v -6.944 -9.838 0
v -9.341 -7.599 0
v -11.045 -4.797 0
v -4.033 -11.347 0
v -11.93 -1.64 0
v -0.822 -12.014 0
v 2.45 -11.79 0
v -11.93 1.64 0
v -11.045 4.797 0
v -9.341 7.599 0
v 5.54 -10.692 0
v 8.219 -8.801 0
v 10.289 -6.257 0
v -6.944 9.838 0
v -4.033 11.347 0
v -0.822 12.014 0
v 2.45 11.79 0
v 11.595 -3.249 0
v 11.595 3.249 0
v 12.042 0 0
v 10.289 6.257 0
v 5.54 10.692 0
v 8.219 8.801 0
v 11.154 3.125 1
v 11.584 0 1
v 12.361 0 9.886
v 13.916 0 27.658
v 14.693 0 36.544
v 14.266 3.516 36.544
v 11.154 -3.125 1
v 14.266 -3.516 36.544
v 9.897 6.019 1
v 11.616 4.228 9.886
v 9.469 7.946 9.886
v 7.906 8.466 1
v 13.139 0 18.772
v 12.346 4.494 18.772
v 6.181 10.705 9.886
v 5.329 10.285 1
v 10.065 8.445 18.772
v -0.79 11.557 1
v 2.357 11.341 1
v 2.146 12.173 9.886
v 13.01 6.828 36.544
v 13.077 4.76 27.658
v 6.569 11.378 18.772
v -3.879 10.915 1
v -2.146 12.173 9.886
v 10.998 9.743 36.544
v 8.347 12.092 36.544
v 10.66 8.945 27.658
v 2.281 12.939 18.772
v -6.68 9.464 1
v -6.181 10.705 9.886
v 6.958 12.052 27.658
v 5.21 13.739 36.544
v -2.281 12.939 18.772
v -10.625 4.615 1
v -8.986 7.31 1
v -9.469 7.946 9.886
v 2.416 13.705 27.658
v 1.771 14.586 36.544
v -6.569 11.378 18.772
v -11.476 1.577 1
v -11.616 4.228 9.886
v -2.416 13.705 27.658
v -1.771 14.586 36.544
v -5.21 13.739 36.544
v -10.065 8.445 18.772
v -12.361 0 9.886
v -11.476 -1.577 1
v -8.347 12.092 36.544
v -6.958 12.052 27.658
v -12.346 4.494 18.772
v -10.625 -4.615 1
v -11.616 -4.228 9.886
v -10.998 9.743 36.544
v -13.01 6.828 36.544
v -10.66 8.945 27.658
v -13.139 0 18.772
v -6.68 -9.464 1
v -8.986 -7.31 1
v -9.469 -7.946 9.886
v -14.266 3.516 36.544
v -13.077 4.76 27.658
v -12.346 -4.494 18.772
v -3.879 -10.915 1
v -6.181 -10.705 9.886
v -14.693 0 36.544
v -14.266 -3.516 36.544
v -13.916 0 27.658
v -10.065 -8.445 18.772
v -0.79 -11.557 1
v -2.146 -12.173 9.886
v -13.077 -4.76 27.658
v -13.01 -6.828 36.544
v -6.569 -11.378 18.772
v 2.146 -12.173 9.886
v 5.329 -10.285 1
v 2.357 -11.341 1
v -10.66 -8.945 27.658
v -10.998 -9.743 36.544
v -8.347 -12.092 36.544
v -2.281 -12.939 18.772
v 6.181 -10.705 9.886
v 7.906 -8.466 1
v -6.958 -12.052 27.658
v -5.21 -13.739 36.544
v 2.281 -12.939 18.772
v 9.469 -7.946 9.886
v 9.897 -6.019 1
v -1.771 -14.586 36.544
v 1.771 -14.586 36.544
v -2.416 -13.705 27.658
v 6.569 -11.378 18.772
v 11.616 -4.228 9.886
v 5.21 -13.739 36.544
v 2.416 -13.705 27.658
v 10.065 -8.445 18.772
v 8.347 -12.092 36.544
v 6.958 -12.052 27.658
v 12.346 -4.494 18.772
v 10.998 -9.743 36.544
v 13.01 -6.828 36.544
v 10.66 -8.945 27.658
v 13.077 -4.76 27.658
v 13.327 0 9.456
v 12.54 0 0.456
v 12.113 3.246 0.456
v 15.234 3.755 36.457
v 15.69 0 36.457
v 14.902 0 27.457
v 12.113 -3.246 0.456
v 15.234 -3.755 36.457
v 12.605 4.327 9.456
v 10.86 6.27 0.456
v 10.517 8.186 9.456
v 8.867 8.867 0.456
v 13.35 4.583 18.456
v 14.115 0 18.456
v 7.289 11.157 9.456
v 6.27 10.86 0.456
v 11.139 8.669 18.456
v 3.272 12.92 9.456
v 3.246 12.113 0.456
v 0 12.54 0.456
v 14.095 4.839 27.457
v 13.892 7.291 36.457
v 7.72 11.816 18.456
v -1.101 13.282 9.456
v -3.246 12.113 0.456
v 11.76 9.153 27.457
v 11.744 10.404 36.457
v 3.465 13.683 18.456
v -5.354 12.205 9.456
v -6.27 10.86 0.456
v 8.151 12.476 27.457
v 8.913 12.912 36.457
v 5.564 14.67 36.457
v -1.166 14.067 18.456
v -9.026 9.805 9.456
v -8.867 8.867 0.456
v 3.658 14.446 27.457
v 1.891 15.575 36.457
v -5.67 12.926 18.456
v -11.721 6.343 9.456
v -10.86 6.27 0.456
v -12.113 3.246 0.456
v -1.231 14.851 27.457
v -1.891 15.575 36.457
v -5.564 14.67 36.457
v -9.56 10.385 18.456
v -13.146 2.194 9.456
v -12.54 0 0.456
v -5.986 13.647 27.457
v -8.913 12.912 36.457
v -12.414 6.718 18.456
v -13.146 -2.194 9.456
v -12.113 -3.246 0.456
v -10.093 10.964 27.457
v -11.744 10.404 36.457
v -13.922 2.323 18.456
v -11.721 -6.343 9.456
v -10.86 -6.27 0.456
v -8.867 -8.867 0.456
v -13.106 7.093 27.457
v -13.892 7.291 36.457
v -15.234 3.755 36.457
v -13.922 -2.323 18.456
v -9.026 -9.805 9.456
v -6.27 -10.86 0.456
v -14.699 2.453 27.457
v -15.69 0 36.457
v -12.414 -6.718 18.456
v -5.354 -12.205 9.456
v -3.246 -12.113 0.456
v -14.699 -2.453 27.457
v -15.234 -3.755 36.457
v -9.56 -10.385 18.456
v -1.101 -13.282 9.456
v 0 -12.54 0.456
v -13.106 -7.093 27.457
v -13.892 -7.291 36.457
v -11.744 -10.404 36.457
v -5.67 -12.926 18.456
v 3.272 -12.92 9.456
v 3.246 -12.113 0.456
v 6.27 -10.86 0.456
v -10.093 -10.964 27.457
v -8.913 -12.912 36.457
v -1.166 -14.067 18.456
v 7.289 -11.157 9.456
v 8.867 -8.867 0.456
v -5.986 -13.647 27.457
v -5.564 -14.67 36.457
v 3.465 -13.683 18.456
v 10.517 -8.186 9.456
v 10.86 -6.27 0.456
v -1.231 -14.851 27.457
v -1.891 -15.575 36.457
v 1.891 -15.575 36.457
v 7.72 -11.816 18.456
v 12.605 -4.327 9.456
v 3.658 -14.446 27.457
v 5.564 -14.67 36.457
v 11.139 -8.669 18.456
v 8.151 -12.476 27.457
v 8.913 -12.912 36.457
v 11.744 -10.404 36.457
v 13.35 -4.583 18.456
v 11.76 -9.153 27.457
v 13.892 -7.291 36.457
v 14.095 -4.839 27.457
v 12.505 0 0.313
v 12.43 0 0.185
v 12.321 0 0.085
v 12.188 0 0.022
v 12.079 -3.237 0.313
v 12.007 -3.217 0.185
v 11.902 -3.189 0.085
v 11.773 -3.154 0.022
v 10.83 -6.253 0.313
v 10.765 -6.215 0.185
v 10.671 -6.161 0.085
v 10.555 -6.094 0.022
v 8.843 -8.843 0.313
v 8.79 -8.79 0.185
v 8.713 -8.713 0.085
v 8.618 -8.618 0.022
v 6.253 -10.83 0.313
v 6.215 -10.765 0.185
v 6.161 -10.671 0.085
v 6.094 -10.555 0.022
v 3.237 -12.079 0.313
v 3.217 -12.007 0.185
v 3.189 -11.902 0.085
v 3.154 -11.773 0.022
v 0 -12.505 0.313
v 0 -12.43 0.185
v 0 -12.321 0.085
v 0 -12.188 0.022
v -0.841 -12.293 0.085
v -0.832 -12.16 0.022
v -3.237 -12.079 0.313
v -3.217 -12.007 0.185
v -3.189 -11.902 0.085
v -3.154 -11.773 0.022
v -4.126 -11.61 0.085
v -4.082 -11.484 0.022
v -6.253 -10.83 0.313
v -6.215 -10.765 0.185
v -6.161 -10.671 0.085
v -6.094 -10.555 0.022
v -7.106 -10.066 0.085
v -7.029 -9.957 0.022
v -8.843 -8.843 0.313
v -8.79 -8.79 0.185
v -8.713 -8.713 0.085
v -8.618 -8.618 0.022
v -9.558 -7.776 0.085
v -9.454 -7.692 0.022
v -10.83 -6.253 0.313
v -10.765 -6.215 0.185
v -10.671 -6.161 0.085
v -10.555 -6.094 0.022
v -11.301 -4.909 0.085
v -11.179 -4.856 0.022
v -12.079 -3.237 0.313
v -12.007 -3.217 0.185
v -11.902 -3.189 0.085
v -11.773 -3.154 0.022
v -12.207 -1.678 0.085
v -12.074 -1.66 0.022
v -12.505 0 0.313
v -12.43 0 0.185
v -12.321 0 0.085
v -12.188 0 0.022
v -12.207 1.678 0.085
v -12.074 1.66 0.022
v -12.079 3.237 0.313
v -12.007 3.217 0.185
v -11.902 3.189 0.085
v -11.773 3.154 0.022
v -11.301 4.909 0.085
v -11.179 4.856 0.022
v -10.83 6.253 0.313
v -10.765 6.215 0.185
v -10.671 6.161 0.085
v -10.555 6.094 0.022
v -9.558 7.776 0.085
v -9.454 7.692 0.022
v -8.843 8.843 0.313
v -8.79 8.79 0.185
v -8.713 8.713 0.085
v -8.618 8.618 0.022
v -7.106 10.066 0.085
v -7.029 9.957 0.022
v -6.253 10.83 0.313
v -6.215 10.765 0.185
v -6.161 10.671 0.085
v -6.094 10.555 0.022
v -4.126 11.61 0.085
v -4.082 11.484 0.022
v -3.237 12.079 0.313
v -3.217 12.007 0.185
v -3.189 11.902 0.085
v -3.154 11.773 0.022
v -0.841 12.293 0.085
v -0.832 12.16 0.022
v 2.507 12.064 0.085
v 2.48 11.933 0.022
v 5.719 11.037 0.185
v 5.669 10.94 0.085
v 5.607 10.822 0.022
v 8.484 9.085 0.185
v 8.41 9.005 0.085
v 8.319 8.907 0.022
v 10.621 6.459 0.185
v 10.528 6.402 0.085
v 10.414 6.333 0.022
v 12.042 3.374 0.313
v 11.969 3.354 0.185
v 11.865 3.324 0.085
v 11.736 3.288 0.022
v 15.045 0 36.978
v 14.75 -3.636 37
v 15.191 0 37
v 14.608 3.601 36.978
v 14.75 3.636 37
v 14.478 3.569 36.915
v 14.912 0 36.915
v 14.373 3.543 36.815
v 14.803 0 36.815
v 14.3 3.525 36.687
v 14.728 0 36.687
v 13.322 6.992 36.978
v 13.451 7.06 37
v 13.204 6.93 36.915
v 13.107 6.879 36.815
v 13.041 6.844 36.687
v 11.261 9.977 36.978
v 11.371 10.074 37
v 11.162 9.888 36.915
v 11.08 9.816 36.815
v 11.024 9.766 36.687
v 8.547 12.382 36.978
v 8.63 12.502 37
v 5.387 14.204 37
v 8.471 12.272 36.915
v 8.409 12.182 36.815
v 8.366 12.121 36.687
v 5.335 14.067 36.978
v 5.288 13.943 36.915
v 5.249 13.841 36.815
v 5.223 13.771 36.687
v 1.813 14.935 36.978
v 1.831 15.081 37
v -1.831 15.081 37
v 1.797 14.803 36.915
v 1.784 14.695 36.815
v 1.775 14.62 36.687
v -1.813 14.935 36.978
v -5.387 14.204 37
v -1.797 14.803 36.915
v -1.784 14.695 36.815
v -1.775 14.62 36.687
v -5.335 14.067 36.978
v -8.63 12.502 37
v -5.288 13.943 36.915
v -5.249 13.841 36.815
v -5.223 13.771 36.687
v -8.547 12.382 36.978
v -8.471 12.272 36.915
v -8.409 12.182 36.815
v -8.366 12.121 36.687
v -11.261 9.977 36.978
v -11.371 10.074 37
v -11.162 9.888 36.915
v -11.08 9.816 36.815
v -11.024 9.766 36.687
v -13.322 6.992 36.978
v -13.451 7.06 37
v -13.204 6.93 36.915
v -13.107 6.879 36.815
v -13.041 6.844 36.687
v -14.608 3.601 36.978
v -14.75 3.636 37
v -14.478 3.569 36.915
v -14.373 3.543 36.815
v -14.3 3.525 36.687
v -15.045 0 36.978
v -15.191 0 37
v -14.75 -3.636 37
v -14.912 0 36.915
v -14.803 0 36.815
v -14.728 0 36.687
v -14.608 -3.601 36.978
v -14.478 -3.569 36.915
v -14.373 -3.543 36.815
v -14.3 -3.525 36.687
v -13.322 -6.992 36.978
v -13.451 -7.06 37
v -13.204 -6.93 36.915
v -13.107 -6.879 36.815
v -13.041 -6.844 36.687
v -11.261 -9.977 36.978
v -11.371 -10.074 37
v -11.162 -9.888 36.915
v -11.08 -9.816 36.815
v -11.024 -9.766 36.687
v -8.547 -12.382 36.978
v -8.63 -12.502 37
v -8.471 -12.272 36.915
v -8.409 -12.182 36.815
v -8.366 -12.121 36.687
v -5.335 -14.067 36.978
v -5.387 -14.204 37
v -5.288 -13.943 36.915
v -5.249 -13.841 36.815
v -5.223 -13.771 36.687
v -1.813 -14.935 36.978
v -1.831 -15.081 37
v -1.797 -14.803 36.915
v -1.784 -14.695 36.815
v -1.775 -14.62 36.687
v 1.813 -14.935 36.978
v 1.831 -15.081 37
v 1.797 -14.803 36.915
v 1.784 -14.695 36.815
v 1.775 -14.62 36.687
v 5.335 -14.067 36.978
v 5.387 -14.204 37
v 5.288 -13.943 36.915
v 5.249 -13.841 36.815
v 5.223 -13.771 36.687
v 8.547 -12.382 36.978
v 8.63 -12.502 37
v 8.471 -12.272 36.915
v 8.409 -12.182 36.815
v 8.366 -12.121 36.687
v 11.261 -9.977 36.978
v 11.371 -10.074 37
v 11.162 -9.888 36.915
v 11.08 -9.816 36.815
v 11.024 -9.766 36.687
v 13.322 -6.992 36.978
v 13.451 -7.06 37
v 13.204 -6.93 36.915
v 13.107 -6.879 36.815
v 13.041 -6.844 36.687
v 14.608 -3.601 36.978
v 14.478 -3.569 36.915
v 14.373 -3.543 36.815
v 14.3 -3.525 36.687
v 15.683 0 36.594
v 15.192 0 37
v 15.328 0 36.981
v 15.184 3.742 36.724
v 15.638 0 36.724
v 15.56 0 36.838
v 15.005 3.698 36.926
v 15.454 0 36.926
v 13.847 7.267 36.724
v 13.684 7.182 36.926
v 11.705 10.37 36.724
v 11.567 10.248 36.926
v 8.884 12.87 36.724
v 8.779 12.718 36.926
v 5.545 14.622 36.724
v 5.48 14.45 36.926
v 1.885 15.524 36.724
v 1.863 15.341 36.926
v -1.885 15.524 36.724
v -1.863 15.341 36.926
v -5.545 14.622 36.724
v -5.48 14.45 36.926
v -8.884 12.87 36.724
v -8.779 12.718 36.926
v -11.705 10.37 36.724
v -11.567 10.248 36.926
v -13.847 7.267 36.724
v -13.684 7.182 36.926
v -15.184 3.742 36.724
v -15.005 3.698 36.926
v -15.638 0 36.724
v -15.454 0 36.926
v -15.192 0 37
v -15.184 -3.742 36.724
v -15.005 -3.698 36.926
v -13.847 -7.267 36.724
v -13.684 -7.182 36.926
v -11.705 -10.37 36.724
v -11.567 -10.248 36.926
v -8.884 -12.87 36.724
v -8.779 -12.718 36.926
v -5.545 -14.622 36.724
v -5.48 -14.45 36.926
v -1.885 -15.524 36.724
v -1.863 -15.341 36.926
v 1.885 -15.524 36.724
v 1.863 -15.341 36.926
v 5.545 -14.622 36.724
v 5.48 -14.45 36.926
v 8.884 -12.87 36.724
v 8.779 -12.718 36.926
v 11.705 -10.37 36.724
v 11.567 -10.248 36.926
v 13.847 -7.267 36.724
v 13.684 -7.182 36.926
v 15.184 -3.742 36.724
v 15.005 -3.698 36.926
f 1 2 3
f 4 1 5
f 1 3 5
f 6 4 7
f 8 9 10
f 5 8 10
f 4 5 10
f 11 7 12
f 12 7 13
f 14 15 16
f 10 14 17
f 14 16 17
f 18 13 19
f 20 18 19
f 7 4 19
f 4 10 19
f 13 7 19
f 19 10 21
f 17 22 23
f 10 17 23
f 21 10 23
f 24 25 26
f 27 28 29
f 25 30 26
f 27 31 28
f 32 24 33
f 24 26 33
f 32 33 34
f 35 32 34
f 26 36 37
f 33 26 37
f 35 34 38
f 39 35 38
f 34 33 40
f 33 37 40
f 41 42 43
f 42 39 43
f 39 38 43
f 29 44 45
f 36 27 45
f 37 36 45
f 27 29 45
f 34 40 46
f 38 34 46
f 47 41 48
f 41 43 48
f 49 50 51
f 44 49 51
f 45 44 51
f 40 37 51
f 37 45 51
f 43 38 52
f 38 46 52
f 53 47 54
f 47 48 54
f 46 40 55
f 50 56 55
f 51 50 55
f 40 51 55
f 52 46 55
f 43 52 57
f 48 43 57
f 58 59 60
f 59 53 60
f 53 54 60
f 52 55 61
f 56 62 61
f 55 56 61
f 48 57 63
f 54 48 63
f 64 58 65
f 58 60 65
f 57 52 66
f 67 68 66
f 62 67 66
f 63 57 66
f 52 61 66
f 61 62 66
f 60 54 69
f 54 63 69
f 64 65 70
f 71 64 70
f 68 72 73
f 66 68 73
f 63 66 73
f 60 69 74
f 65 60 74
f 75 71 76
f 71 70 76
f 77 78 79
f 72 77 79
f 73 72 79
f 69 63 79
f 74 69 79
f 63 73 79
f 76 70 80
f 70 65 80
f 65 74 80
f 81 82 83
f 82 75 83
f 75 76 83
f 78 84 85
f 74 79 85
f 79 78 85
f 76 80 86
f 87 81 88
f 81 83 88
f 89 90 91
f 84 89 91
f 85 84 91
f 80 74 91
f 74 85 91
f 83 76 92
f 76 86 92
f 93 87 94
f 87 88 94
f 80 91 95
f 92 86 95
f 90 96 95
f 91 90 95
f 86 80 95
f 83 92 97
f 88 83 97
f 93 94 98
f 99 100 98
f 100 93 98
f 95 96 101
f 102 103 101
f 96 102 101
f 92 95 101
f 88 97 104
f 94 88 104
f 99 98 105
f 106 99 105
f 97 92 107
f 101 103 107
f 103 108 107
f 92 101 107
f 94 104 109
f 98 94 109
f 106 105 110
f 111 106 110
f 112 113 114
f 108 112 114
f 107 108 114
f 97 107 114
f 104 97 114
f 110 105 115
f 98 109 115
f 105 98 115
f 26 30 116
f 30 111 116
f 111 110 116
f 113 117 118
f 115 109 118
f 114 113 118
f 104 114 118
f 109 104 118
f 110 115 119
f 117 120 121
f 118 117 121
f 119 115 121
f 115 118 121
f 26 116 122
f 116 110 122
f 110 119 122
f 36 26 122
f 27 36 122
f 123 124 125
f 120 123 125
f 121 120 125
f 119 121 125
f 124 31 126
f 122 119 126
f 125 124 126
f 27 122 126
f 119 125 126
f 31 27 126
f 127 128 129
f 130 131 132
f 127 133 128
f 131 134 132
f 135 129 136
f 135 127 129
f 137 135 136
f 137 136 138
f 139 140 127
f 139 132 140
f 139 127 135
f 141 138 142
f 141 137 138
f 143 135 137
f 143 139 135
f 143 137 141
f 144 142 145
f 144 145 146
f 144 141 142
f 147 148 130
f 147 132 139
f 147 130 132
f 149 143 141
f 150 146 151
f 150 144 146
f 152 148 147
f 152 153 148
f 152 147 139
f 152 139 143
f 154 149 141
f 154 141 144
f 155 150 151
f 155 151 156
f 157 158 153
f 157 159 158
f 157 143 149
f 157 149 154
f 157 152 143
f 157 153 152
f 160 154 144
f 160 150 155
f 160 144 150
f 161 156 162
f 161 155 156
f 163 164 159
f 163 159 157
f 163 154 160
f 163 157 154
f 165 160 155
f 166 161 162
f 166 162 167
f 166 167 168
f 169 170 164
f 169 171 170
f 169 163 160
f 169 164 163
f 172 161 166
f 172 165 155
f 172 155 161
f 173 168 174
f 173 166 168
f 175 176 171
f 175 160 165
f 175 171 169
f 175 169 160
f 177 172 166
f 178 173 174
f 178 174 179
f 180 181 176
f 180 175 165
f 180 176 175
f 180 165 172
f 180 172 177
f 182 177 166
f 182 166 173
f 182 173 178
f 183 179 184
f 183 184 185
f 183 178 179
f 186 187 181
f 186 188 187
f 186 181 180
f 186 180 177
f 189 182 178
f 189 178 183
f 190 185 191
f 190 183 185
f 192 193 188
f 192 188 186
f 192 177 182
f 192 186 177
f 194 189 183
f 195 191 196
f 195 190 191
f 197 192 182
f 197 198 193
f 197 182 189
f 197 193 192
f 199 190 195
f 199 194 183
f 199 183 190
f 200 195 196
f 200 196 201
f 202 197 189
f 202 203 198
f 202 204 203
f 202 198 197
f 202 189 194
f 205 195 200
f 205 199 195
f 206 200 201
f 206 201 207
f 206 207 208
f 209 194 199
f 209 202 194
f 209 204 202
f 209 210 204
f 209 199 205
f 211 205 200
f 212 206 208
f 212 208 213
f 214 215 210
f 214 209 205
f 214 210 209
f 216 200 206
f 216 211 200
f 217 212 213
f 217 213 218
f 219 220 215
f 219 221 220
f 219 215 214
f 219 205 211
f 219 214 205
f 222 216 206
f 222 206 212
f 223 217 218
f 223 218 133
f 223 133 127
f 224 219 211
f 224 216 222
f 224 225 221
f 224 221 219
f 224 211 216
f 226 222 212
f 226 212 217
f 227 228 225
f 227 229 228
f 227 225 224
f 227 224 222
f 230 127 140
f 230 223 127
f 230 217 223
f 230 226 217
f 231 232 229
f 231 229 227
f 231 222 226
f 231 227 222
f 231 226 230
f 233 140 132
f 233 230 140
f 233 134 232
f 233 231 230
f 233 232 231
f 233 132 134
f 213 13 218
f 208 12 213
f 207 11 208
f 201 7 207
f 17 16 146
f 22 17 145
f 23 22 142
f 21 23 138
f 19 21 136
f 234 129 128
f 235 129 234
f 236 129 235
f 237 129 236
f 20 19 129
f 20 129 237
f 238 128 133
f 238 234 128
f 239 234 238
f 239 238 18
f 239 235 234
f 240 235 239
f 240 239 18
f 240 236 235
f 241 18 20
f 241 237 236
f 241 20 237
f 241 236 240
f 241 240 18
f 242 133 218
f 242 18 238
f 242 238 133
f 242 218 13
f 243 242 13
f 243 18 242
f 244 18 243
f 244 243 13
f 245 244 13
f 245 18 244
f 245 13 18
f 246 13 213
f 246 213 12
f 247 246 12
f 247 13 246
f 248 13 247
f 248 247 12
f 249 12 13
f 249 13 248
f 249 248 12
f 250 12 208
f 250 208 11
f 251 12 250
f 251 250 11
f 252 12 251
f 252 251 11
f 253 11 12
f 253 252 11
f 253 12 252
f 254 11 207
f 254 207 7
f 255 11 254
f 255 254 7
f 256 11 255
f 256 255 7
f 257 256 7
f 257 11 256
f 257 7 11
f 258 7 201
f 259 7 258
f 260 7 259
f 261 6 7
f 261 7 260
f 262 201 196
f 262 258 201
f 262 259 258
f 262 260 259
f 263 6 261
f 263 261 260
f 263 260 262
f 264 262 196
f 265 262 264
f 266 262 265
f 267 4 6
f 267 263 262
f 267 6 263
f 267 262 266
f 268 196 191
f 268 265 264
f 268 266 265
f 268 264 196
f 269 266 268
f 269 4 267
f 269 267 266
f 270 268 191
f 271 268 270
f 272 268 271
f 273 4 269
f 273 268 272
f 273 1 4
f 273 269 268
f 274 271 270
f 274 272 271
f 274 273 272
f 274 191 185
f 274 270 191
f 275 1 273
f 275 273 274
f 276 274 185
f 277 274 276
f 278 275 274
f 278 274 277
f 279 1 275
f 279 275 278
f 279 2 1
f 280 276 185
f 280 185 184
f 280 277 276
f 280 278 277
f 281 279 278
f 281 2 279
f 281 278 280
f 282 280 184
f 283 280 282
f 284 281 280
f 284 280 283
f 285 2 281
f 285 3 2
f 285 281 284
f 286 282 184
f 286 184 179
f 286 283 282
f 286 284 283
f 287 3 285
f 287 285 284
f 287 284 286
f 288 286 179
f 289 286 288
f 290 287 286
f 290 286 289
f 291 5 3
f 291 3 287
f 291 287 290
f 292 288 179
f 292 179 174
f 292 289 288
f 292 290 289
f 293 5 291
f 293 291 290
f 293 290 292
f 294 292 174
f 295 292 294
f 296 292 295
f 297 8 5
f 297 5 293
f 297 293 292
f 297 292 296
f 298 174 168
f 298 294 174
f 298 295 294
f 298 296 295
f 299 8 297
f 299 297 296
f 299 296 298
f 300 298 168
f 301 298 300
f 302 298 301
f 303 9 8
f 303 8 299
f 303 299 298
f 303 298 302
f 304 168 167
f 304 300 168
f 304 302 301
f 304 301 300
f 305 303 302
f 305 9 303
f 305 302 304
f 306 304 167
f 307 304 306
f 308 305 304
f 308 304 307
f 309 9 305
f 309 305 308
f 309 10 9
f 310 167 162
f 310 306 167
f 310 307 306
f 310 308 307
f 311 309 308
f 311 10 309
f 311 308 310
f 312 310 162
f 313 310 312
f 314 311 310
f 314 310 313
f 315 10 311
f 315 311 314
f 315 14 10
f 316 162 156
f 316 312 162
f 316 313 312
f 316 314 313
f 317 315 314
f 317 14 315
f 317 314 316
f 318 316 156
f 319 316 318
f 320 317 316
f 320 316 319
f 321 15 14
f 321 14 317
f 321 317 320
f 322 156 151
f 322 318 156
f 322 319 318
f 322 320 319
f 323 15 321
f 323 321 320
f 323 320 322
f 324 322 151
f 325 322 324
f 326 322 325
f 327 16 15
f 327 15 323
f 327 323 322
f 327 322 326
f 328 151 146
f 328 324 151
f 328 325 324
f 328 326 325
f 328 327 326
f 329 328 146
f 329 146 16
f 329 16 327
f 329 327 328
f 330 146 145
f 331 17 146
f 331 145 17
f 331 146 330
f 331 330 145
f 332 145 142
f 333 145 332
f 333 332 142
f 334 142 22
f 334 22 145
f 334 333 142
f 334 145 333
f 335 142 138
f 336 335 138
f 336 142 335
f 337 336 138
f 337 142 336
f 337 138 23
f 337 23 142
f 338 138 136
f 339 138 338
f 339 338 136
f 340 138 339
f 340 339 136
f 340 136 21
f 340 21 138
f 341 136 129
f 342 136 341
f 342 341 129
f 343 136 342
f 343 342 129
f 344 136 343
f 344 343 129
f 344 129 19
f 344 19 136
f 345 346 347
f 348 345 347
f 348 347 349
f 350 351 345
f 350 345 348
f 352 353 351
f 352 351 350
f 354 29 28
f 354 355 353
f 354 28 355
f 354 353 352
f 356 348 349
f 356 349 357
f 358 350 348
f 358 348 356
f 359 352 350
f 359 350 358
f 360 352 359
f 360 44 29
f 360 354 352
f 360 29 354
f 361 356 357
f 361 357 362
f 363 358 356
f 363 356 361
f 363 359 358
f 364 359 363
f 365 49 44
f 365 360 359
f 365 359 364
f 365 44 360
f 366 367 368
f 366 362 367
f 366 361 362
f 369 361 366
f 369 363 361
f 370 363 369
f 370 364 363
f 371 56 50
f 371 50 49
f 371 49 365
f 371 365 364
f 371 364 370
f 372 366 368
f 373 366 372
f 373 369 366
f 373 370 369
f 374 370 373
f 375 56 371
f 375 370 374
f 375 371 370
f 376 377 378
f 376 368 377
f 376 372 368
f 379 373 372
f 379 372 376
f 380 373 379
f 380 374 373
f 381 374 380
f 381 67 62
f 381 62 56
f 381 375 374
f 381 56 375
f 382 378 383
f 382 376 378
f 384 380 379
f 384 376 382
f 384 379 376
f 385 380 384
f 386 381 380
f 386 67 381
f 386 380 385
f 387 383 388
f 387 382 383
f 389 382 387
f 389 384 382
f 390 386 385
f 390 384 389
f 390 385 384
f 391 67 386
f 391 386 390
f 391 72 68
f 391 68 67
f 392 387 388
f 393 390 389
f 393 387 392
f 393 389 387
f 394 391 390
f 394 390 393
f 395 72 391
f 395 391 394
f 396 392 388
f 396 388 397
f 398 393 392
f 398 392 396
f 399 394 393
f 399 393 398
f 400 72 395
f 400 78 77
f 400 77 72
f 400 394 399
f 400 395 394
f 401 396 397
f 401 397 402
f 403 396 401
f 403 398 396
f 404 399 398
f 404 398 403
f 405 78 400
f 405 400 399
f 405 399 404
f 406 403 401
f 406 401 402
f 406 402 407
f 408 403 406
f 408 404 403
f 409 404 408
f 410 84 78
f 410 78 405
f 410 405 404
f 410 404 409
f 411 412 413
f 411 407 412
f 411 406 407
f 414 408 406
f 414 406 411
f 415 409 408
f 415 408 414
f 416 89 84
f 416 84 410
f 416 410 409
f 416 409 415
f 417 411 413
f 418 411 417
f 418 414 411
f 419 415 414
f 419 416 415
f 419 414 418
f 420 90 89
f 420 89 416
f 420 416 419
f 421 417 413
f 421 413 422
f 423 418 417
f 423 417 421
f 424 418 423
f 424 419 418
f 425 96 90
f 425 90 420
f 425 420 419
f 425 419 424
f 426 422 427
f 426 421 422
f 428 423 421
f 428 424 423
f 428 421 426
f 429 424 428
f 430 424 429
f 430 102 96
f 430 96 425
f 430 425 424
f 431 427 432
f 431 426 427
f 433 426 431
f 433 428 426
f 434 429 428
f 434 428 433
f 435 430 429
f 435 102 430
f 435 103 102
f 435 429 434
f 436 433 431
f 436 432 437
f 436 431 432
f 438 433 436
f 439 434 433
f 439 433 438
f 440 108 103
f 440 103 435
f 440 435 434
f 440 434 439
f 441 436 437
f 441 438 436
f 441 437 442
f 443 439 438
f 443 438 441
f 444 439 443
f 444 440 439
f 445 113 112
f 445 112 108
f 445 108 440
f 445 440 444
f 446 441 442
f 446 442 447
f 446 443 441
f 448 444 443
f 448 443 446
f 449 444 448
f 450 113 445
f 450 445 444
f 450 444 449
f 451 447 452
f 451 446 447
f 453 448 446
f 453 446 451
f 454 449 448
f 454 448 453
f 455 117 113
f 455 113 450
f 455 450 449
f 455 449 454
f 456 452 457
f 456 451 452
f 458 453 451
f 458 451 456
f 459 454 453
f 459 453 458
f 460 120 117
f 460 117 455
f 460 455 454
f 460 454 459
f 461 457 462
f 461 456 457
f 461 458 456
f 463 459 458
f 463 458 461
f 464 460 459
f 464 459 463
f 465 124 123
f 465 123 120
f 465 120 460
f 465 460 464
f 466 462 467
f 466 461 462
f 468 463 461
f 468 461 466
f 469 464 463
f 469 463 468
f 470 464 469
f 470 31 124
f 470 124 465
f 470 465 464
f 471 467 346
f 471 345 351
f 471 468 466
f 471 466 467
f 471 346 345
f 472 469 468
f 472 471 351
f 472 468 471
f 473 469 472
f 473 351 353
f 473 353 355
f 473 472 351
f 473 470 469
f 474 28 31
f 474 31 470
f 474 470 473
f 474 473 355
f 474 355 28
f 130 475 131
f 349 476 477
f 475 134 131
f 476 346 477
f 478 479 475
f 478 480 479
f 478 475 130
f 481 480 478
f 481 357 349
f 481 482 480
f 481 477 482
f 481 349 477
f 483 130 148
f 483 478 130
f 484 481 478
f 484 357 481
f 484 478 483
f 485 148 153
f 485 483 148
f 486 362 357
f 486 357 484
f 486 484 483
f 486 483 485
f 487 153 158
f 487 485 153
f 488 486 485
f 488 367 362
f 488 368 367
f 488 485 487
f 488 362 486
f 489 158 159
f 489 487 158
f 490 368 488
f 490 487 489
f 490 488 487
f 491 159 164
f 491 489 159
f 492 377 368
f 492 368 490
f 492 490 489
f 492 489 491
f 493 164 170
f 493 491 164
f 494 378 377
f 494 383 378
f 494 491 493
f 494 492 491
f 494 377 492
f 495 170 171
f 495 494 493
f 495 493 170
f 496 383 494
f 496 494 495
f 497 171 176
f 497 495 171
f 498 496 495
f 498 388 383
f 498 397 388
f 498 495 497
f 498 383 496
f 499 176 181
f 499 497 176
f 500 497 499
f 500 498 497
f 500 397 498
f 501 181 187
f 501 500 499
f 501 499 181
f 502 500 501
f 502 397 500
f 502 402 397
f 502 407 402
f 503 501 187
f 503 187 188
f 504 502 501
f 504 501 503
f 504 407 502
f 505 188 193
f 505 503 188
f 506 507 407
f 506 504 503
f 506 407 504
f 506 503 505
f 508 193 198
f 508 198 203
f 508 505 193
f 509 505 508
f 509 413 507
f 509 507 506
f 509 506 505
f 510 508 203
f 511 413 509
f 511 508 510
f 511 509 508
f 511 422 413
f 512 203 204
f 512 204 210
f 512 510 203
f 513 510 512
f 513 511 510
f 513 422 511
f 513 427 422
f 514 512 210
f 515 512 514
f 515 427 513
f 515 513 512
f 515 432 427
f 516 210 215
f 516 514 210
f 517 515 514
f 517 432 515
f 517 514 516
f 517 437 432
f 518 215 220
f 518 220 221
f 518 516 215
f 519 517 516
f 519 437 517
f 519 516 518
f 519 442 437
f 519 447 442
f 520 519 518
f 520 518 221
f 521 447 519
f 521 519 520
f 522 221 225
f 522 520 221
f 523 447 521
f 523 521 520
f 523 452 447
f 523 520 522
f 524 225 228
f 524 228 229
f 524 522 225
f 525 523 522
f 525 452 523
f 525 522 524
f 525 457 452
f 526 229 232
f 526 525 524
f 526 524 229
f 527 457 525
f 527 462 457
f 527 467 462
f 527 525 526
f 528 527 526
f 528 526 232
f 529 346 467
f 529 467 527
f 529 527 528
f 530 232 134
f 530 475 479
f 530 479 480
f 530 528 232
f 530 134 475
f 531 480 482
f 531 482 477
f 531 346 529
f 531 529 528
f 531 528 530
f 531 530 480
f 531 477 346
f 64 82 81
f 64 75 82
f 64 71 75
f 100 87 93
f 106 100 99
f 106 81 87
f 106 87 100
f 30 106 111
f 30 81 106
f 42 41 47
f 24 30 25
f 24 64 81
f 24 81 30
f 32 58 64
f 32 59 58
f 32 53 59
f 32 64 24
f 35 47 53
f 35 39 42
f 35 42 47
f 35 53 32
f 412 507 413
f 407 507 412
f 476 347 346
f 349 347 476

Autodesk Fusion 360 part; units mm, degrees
sketch "Sketch1" plane through (0, 0, 0) normal (0, 0, 1) x (1, 0, 0)
  circle A0 centre (0, 0) radius 12.5
  dimension "d1" = 25
extrude "Extrude1" add sketch "Sketch1" along normal blind 37 draft 5
shell "Shell1" thickness 1 removed faces 1 at (-7.81, 2.0449, 37)
fillet "Fillet1" radius 0.5 2 edges at (-14.6721, 5.6908, 37) (-13.7362, 5.3278, 37)
fillet "Fillet2" radius 0.5 1 edges at (-11.6541, -4.5202, 0)
